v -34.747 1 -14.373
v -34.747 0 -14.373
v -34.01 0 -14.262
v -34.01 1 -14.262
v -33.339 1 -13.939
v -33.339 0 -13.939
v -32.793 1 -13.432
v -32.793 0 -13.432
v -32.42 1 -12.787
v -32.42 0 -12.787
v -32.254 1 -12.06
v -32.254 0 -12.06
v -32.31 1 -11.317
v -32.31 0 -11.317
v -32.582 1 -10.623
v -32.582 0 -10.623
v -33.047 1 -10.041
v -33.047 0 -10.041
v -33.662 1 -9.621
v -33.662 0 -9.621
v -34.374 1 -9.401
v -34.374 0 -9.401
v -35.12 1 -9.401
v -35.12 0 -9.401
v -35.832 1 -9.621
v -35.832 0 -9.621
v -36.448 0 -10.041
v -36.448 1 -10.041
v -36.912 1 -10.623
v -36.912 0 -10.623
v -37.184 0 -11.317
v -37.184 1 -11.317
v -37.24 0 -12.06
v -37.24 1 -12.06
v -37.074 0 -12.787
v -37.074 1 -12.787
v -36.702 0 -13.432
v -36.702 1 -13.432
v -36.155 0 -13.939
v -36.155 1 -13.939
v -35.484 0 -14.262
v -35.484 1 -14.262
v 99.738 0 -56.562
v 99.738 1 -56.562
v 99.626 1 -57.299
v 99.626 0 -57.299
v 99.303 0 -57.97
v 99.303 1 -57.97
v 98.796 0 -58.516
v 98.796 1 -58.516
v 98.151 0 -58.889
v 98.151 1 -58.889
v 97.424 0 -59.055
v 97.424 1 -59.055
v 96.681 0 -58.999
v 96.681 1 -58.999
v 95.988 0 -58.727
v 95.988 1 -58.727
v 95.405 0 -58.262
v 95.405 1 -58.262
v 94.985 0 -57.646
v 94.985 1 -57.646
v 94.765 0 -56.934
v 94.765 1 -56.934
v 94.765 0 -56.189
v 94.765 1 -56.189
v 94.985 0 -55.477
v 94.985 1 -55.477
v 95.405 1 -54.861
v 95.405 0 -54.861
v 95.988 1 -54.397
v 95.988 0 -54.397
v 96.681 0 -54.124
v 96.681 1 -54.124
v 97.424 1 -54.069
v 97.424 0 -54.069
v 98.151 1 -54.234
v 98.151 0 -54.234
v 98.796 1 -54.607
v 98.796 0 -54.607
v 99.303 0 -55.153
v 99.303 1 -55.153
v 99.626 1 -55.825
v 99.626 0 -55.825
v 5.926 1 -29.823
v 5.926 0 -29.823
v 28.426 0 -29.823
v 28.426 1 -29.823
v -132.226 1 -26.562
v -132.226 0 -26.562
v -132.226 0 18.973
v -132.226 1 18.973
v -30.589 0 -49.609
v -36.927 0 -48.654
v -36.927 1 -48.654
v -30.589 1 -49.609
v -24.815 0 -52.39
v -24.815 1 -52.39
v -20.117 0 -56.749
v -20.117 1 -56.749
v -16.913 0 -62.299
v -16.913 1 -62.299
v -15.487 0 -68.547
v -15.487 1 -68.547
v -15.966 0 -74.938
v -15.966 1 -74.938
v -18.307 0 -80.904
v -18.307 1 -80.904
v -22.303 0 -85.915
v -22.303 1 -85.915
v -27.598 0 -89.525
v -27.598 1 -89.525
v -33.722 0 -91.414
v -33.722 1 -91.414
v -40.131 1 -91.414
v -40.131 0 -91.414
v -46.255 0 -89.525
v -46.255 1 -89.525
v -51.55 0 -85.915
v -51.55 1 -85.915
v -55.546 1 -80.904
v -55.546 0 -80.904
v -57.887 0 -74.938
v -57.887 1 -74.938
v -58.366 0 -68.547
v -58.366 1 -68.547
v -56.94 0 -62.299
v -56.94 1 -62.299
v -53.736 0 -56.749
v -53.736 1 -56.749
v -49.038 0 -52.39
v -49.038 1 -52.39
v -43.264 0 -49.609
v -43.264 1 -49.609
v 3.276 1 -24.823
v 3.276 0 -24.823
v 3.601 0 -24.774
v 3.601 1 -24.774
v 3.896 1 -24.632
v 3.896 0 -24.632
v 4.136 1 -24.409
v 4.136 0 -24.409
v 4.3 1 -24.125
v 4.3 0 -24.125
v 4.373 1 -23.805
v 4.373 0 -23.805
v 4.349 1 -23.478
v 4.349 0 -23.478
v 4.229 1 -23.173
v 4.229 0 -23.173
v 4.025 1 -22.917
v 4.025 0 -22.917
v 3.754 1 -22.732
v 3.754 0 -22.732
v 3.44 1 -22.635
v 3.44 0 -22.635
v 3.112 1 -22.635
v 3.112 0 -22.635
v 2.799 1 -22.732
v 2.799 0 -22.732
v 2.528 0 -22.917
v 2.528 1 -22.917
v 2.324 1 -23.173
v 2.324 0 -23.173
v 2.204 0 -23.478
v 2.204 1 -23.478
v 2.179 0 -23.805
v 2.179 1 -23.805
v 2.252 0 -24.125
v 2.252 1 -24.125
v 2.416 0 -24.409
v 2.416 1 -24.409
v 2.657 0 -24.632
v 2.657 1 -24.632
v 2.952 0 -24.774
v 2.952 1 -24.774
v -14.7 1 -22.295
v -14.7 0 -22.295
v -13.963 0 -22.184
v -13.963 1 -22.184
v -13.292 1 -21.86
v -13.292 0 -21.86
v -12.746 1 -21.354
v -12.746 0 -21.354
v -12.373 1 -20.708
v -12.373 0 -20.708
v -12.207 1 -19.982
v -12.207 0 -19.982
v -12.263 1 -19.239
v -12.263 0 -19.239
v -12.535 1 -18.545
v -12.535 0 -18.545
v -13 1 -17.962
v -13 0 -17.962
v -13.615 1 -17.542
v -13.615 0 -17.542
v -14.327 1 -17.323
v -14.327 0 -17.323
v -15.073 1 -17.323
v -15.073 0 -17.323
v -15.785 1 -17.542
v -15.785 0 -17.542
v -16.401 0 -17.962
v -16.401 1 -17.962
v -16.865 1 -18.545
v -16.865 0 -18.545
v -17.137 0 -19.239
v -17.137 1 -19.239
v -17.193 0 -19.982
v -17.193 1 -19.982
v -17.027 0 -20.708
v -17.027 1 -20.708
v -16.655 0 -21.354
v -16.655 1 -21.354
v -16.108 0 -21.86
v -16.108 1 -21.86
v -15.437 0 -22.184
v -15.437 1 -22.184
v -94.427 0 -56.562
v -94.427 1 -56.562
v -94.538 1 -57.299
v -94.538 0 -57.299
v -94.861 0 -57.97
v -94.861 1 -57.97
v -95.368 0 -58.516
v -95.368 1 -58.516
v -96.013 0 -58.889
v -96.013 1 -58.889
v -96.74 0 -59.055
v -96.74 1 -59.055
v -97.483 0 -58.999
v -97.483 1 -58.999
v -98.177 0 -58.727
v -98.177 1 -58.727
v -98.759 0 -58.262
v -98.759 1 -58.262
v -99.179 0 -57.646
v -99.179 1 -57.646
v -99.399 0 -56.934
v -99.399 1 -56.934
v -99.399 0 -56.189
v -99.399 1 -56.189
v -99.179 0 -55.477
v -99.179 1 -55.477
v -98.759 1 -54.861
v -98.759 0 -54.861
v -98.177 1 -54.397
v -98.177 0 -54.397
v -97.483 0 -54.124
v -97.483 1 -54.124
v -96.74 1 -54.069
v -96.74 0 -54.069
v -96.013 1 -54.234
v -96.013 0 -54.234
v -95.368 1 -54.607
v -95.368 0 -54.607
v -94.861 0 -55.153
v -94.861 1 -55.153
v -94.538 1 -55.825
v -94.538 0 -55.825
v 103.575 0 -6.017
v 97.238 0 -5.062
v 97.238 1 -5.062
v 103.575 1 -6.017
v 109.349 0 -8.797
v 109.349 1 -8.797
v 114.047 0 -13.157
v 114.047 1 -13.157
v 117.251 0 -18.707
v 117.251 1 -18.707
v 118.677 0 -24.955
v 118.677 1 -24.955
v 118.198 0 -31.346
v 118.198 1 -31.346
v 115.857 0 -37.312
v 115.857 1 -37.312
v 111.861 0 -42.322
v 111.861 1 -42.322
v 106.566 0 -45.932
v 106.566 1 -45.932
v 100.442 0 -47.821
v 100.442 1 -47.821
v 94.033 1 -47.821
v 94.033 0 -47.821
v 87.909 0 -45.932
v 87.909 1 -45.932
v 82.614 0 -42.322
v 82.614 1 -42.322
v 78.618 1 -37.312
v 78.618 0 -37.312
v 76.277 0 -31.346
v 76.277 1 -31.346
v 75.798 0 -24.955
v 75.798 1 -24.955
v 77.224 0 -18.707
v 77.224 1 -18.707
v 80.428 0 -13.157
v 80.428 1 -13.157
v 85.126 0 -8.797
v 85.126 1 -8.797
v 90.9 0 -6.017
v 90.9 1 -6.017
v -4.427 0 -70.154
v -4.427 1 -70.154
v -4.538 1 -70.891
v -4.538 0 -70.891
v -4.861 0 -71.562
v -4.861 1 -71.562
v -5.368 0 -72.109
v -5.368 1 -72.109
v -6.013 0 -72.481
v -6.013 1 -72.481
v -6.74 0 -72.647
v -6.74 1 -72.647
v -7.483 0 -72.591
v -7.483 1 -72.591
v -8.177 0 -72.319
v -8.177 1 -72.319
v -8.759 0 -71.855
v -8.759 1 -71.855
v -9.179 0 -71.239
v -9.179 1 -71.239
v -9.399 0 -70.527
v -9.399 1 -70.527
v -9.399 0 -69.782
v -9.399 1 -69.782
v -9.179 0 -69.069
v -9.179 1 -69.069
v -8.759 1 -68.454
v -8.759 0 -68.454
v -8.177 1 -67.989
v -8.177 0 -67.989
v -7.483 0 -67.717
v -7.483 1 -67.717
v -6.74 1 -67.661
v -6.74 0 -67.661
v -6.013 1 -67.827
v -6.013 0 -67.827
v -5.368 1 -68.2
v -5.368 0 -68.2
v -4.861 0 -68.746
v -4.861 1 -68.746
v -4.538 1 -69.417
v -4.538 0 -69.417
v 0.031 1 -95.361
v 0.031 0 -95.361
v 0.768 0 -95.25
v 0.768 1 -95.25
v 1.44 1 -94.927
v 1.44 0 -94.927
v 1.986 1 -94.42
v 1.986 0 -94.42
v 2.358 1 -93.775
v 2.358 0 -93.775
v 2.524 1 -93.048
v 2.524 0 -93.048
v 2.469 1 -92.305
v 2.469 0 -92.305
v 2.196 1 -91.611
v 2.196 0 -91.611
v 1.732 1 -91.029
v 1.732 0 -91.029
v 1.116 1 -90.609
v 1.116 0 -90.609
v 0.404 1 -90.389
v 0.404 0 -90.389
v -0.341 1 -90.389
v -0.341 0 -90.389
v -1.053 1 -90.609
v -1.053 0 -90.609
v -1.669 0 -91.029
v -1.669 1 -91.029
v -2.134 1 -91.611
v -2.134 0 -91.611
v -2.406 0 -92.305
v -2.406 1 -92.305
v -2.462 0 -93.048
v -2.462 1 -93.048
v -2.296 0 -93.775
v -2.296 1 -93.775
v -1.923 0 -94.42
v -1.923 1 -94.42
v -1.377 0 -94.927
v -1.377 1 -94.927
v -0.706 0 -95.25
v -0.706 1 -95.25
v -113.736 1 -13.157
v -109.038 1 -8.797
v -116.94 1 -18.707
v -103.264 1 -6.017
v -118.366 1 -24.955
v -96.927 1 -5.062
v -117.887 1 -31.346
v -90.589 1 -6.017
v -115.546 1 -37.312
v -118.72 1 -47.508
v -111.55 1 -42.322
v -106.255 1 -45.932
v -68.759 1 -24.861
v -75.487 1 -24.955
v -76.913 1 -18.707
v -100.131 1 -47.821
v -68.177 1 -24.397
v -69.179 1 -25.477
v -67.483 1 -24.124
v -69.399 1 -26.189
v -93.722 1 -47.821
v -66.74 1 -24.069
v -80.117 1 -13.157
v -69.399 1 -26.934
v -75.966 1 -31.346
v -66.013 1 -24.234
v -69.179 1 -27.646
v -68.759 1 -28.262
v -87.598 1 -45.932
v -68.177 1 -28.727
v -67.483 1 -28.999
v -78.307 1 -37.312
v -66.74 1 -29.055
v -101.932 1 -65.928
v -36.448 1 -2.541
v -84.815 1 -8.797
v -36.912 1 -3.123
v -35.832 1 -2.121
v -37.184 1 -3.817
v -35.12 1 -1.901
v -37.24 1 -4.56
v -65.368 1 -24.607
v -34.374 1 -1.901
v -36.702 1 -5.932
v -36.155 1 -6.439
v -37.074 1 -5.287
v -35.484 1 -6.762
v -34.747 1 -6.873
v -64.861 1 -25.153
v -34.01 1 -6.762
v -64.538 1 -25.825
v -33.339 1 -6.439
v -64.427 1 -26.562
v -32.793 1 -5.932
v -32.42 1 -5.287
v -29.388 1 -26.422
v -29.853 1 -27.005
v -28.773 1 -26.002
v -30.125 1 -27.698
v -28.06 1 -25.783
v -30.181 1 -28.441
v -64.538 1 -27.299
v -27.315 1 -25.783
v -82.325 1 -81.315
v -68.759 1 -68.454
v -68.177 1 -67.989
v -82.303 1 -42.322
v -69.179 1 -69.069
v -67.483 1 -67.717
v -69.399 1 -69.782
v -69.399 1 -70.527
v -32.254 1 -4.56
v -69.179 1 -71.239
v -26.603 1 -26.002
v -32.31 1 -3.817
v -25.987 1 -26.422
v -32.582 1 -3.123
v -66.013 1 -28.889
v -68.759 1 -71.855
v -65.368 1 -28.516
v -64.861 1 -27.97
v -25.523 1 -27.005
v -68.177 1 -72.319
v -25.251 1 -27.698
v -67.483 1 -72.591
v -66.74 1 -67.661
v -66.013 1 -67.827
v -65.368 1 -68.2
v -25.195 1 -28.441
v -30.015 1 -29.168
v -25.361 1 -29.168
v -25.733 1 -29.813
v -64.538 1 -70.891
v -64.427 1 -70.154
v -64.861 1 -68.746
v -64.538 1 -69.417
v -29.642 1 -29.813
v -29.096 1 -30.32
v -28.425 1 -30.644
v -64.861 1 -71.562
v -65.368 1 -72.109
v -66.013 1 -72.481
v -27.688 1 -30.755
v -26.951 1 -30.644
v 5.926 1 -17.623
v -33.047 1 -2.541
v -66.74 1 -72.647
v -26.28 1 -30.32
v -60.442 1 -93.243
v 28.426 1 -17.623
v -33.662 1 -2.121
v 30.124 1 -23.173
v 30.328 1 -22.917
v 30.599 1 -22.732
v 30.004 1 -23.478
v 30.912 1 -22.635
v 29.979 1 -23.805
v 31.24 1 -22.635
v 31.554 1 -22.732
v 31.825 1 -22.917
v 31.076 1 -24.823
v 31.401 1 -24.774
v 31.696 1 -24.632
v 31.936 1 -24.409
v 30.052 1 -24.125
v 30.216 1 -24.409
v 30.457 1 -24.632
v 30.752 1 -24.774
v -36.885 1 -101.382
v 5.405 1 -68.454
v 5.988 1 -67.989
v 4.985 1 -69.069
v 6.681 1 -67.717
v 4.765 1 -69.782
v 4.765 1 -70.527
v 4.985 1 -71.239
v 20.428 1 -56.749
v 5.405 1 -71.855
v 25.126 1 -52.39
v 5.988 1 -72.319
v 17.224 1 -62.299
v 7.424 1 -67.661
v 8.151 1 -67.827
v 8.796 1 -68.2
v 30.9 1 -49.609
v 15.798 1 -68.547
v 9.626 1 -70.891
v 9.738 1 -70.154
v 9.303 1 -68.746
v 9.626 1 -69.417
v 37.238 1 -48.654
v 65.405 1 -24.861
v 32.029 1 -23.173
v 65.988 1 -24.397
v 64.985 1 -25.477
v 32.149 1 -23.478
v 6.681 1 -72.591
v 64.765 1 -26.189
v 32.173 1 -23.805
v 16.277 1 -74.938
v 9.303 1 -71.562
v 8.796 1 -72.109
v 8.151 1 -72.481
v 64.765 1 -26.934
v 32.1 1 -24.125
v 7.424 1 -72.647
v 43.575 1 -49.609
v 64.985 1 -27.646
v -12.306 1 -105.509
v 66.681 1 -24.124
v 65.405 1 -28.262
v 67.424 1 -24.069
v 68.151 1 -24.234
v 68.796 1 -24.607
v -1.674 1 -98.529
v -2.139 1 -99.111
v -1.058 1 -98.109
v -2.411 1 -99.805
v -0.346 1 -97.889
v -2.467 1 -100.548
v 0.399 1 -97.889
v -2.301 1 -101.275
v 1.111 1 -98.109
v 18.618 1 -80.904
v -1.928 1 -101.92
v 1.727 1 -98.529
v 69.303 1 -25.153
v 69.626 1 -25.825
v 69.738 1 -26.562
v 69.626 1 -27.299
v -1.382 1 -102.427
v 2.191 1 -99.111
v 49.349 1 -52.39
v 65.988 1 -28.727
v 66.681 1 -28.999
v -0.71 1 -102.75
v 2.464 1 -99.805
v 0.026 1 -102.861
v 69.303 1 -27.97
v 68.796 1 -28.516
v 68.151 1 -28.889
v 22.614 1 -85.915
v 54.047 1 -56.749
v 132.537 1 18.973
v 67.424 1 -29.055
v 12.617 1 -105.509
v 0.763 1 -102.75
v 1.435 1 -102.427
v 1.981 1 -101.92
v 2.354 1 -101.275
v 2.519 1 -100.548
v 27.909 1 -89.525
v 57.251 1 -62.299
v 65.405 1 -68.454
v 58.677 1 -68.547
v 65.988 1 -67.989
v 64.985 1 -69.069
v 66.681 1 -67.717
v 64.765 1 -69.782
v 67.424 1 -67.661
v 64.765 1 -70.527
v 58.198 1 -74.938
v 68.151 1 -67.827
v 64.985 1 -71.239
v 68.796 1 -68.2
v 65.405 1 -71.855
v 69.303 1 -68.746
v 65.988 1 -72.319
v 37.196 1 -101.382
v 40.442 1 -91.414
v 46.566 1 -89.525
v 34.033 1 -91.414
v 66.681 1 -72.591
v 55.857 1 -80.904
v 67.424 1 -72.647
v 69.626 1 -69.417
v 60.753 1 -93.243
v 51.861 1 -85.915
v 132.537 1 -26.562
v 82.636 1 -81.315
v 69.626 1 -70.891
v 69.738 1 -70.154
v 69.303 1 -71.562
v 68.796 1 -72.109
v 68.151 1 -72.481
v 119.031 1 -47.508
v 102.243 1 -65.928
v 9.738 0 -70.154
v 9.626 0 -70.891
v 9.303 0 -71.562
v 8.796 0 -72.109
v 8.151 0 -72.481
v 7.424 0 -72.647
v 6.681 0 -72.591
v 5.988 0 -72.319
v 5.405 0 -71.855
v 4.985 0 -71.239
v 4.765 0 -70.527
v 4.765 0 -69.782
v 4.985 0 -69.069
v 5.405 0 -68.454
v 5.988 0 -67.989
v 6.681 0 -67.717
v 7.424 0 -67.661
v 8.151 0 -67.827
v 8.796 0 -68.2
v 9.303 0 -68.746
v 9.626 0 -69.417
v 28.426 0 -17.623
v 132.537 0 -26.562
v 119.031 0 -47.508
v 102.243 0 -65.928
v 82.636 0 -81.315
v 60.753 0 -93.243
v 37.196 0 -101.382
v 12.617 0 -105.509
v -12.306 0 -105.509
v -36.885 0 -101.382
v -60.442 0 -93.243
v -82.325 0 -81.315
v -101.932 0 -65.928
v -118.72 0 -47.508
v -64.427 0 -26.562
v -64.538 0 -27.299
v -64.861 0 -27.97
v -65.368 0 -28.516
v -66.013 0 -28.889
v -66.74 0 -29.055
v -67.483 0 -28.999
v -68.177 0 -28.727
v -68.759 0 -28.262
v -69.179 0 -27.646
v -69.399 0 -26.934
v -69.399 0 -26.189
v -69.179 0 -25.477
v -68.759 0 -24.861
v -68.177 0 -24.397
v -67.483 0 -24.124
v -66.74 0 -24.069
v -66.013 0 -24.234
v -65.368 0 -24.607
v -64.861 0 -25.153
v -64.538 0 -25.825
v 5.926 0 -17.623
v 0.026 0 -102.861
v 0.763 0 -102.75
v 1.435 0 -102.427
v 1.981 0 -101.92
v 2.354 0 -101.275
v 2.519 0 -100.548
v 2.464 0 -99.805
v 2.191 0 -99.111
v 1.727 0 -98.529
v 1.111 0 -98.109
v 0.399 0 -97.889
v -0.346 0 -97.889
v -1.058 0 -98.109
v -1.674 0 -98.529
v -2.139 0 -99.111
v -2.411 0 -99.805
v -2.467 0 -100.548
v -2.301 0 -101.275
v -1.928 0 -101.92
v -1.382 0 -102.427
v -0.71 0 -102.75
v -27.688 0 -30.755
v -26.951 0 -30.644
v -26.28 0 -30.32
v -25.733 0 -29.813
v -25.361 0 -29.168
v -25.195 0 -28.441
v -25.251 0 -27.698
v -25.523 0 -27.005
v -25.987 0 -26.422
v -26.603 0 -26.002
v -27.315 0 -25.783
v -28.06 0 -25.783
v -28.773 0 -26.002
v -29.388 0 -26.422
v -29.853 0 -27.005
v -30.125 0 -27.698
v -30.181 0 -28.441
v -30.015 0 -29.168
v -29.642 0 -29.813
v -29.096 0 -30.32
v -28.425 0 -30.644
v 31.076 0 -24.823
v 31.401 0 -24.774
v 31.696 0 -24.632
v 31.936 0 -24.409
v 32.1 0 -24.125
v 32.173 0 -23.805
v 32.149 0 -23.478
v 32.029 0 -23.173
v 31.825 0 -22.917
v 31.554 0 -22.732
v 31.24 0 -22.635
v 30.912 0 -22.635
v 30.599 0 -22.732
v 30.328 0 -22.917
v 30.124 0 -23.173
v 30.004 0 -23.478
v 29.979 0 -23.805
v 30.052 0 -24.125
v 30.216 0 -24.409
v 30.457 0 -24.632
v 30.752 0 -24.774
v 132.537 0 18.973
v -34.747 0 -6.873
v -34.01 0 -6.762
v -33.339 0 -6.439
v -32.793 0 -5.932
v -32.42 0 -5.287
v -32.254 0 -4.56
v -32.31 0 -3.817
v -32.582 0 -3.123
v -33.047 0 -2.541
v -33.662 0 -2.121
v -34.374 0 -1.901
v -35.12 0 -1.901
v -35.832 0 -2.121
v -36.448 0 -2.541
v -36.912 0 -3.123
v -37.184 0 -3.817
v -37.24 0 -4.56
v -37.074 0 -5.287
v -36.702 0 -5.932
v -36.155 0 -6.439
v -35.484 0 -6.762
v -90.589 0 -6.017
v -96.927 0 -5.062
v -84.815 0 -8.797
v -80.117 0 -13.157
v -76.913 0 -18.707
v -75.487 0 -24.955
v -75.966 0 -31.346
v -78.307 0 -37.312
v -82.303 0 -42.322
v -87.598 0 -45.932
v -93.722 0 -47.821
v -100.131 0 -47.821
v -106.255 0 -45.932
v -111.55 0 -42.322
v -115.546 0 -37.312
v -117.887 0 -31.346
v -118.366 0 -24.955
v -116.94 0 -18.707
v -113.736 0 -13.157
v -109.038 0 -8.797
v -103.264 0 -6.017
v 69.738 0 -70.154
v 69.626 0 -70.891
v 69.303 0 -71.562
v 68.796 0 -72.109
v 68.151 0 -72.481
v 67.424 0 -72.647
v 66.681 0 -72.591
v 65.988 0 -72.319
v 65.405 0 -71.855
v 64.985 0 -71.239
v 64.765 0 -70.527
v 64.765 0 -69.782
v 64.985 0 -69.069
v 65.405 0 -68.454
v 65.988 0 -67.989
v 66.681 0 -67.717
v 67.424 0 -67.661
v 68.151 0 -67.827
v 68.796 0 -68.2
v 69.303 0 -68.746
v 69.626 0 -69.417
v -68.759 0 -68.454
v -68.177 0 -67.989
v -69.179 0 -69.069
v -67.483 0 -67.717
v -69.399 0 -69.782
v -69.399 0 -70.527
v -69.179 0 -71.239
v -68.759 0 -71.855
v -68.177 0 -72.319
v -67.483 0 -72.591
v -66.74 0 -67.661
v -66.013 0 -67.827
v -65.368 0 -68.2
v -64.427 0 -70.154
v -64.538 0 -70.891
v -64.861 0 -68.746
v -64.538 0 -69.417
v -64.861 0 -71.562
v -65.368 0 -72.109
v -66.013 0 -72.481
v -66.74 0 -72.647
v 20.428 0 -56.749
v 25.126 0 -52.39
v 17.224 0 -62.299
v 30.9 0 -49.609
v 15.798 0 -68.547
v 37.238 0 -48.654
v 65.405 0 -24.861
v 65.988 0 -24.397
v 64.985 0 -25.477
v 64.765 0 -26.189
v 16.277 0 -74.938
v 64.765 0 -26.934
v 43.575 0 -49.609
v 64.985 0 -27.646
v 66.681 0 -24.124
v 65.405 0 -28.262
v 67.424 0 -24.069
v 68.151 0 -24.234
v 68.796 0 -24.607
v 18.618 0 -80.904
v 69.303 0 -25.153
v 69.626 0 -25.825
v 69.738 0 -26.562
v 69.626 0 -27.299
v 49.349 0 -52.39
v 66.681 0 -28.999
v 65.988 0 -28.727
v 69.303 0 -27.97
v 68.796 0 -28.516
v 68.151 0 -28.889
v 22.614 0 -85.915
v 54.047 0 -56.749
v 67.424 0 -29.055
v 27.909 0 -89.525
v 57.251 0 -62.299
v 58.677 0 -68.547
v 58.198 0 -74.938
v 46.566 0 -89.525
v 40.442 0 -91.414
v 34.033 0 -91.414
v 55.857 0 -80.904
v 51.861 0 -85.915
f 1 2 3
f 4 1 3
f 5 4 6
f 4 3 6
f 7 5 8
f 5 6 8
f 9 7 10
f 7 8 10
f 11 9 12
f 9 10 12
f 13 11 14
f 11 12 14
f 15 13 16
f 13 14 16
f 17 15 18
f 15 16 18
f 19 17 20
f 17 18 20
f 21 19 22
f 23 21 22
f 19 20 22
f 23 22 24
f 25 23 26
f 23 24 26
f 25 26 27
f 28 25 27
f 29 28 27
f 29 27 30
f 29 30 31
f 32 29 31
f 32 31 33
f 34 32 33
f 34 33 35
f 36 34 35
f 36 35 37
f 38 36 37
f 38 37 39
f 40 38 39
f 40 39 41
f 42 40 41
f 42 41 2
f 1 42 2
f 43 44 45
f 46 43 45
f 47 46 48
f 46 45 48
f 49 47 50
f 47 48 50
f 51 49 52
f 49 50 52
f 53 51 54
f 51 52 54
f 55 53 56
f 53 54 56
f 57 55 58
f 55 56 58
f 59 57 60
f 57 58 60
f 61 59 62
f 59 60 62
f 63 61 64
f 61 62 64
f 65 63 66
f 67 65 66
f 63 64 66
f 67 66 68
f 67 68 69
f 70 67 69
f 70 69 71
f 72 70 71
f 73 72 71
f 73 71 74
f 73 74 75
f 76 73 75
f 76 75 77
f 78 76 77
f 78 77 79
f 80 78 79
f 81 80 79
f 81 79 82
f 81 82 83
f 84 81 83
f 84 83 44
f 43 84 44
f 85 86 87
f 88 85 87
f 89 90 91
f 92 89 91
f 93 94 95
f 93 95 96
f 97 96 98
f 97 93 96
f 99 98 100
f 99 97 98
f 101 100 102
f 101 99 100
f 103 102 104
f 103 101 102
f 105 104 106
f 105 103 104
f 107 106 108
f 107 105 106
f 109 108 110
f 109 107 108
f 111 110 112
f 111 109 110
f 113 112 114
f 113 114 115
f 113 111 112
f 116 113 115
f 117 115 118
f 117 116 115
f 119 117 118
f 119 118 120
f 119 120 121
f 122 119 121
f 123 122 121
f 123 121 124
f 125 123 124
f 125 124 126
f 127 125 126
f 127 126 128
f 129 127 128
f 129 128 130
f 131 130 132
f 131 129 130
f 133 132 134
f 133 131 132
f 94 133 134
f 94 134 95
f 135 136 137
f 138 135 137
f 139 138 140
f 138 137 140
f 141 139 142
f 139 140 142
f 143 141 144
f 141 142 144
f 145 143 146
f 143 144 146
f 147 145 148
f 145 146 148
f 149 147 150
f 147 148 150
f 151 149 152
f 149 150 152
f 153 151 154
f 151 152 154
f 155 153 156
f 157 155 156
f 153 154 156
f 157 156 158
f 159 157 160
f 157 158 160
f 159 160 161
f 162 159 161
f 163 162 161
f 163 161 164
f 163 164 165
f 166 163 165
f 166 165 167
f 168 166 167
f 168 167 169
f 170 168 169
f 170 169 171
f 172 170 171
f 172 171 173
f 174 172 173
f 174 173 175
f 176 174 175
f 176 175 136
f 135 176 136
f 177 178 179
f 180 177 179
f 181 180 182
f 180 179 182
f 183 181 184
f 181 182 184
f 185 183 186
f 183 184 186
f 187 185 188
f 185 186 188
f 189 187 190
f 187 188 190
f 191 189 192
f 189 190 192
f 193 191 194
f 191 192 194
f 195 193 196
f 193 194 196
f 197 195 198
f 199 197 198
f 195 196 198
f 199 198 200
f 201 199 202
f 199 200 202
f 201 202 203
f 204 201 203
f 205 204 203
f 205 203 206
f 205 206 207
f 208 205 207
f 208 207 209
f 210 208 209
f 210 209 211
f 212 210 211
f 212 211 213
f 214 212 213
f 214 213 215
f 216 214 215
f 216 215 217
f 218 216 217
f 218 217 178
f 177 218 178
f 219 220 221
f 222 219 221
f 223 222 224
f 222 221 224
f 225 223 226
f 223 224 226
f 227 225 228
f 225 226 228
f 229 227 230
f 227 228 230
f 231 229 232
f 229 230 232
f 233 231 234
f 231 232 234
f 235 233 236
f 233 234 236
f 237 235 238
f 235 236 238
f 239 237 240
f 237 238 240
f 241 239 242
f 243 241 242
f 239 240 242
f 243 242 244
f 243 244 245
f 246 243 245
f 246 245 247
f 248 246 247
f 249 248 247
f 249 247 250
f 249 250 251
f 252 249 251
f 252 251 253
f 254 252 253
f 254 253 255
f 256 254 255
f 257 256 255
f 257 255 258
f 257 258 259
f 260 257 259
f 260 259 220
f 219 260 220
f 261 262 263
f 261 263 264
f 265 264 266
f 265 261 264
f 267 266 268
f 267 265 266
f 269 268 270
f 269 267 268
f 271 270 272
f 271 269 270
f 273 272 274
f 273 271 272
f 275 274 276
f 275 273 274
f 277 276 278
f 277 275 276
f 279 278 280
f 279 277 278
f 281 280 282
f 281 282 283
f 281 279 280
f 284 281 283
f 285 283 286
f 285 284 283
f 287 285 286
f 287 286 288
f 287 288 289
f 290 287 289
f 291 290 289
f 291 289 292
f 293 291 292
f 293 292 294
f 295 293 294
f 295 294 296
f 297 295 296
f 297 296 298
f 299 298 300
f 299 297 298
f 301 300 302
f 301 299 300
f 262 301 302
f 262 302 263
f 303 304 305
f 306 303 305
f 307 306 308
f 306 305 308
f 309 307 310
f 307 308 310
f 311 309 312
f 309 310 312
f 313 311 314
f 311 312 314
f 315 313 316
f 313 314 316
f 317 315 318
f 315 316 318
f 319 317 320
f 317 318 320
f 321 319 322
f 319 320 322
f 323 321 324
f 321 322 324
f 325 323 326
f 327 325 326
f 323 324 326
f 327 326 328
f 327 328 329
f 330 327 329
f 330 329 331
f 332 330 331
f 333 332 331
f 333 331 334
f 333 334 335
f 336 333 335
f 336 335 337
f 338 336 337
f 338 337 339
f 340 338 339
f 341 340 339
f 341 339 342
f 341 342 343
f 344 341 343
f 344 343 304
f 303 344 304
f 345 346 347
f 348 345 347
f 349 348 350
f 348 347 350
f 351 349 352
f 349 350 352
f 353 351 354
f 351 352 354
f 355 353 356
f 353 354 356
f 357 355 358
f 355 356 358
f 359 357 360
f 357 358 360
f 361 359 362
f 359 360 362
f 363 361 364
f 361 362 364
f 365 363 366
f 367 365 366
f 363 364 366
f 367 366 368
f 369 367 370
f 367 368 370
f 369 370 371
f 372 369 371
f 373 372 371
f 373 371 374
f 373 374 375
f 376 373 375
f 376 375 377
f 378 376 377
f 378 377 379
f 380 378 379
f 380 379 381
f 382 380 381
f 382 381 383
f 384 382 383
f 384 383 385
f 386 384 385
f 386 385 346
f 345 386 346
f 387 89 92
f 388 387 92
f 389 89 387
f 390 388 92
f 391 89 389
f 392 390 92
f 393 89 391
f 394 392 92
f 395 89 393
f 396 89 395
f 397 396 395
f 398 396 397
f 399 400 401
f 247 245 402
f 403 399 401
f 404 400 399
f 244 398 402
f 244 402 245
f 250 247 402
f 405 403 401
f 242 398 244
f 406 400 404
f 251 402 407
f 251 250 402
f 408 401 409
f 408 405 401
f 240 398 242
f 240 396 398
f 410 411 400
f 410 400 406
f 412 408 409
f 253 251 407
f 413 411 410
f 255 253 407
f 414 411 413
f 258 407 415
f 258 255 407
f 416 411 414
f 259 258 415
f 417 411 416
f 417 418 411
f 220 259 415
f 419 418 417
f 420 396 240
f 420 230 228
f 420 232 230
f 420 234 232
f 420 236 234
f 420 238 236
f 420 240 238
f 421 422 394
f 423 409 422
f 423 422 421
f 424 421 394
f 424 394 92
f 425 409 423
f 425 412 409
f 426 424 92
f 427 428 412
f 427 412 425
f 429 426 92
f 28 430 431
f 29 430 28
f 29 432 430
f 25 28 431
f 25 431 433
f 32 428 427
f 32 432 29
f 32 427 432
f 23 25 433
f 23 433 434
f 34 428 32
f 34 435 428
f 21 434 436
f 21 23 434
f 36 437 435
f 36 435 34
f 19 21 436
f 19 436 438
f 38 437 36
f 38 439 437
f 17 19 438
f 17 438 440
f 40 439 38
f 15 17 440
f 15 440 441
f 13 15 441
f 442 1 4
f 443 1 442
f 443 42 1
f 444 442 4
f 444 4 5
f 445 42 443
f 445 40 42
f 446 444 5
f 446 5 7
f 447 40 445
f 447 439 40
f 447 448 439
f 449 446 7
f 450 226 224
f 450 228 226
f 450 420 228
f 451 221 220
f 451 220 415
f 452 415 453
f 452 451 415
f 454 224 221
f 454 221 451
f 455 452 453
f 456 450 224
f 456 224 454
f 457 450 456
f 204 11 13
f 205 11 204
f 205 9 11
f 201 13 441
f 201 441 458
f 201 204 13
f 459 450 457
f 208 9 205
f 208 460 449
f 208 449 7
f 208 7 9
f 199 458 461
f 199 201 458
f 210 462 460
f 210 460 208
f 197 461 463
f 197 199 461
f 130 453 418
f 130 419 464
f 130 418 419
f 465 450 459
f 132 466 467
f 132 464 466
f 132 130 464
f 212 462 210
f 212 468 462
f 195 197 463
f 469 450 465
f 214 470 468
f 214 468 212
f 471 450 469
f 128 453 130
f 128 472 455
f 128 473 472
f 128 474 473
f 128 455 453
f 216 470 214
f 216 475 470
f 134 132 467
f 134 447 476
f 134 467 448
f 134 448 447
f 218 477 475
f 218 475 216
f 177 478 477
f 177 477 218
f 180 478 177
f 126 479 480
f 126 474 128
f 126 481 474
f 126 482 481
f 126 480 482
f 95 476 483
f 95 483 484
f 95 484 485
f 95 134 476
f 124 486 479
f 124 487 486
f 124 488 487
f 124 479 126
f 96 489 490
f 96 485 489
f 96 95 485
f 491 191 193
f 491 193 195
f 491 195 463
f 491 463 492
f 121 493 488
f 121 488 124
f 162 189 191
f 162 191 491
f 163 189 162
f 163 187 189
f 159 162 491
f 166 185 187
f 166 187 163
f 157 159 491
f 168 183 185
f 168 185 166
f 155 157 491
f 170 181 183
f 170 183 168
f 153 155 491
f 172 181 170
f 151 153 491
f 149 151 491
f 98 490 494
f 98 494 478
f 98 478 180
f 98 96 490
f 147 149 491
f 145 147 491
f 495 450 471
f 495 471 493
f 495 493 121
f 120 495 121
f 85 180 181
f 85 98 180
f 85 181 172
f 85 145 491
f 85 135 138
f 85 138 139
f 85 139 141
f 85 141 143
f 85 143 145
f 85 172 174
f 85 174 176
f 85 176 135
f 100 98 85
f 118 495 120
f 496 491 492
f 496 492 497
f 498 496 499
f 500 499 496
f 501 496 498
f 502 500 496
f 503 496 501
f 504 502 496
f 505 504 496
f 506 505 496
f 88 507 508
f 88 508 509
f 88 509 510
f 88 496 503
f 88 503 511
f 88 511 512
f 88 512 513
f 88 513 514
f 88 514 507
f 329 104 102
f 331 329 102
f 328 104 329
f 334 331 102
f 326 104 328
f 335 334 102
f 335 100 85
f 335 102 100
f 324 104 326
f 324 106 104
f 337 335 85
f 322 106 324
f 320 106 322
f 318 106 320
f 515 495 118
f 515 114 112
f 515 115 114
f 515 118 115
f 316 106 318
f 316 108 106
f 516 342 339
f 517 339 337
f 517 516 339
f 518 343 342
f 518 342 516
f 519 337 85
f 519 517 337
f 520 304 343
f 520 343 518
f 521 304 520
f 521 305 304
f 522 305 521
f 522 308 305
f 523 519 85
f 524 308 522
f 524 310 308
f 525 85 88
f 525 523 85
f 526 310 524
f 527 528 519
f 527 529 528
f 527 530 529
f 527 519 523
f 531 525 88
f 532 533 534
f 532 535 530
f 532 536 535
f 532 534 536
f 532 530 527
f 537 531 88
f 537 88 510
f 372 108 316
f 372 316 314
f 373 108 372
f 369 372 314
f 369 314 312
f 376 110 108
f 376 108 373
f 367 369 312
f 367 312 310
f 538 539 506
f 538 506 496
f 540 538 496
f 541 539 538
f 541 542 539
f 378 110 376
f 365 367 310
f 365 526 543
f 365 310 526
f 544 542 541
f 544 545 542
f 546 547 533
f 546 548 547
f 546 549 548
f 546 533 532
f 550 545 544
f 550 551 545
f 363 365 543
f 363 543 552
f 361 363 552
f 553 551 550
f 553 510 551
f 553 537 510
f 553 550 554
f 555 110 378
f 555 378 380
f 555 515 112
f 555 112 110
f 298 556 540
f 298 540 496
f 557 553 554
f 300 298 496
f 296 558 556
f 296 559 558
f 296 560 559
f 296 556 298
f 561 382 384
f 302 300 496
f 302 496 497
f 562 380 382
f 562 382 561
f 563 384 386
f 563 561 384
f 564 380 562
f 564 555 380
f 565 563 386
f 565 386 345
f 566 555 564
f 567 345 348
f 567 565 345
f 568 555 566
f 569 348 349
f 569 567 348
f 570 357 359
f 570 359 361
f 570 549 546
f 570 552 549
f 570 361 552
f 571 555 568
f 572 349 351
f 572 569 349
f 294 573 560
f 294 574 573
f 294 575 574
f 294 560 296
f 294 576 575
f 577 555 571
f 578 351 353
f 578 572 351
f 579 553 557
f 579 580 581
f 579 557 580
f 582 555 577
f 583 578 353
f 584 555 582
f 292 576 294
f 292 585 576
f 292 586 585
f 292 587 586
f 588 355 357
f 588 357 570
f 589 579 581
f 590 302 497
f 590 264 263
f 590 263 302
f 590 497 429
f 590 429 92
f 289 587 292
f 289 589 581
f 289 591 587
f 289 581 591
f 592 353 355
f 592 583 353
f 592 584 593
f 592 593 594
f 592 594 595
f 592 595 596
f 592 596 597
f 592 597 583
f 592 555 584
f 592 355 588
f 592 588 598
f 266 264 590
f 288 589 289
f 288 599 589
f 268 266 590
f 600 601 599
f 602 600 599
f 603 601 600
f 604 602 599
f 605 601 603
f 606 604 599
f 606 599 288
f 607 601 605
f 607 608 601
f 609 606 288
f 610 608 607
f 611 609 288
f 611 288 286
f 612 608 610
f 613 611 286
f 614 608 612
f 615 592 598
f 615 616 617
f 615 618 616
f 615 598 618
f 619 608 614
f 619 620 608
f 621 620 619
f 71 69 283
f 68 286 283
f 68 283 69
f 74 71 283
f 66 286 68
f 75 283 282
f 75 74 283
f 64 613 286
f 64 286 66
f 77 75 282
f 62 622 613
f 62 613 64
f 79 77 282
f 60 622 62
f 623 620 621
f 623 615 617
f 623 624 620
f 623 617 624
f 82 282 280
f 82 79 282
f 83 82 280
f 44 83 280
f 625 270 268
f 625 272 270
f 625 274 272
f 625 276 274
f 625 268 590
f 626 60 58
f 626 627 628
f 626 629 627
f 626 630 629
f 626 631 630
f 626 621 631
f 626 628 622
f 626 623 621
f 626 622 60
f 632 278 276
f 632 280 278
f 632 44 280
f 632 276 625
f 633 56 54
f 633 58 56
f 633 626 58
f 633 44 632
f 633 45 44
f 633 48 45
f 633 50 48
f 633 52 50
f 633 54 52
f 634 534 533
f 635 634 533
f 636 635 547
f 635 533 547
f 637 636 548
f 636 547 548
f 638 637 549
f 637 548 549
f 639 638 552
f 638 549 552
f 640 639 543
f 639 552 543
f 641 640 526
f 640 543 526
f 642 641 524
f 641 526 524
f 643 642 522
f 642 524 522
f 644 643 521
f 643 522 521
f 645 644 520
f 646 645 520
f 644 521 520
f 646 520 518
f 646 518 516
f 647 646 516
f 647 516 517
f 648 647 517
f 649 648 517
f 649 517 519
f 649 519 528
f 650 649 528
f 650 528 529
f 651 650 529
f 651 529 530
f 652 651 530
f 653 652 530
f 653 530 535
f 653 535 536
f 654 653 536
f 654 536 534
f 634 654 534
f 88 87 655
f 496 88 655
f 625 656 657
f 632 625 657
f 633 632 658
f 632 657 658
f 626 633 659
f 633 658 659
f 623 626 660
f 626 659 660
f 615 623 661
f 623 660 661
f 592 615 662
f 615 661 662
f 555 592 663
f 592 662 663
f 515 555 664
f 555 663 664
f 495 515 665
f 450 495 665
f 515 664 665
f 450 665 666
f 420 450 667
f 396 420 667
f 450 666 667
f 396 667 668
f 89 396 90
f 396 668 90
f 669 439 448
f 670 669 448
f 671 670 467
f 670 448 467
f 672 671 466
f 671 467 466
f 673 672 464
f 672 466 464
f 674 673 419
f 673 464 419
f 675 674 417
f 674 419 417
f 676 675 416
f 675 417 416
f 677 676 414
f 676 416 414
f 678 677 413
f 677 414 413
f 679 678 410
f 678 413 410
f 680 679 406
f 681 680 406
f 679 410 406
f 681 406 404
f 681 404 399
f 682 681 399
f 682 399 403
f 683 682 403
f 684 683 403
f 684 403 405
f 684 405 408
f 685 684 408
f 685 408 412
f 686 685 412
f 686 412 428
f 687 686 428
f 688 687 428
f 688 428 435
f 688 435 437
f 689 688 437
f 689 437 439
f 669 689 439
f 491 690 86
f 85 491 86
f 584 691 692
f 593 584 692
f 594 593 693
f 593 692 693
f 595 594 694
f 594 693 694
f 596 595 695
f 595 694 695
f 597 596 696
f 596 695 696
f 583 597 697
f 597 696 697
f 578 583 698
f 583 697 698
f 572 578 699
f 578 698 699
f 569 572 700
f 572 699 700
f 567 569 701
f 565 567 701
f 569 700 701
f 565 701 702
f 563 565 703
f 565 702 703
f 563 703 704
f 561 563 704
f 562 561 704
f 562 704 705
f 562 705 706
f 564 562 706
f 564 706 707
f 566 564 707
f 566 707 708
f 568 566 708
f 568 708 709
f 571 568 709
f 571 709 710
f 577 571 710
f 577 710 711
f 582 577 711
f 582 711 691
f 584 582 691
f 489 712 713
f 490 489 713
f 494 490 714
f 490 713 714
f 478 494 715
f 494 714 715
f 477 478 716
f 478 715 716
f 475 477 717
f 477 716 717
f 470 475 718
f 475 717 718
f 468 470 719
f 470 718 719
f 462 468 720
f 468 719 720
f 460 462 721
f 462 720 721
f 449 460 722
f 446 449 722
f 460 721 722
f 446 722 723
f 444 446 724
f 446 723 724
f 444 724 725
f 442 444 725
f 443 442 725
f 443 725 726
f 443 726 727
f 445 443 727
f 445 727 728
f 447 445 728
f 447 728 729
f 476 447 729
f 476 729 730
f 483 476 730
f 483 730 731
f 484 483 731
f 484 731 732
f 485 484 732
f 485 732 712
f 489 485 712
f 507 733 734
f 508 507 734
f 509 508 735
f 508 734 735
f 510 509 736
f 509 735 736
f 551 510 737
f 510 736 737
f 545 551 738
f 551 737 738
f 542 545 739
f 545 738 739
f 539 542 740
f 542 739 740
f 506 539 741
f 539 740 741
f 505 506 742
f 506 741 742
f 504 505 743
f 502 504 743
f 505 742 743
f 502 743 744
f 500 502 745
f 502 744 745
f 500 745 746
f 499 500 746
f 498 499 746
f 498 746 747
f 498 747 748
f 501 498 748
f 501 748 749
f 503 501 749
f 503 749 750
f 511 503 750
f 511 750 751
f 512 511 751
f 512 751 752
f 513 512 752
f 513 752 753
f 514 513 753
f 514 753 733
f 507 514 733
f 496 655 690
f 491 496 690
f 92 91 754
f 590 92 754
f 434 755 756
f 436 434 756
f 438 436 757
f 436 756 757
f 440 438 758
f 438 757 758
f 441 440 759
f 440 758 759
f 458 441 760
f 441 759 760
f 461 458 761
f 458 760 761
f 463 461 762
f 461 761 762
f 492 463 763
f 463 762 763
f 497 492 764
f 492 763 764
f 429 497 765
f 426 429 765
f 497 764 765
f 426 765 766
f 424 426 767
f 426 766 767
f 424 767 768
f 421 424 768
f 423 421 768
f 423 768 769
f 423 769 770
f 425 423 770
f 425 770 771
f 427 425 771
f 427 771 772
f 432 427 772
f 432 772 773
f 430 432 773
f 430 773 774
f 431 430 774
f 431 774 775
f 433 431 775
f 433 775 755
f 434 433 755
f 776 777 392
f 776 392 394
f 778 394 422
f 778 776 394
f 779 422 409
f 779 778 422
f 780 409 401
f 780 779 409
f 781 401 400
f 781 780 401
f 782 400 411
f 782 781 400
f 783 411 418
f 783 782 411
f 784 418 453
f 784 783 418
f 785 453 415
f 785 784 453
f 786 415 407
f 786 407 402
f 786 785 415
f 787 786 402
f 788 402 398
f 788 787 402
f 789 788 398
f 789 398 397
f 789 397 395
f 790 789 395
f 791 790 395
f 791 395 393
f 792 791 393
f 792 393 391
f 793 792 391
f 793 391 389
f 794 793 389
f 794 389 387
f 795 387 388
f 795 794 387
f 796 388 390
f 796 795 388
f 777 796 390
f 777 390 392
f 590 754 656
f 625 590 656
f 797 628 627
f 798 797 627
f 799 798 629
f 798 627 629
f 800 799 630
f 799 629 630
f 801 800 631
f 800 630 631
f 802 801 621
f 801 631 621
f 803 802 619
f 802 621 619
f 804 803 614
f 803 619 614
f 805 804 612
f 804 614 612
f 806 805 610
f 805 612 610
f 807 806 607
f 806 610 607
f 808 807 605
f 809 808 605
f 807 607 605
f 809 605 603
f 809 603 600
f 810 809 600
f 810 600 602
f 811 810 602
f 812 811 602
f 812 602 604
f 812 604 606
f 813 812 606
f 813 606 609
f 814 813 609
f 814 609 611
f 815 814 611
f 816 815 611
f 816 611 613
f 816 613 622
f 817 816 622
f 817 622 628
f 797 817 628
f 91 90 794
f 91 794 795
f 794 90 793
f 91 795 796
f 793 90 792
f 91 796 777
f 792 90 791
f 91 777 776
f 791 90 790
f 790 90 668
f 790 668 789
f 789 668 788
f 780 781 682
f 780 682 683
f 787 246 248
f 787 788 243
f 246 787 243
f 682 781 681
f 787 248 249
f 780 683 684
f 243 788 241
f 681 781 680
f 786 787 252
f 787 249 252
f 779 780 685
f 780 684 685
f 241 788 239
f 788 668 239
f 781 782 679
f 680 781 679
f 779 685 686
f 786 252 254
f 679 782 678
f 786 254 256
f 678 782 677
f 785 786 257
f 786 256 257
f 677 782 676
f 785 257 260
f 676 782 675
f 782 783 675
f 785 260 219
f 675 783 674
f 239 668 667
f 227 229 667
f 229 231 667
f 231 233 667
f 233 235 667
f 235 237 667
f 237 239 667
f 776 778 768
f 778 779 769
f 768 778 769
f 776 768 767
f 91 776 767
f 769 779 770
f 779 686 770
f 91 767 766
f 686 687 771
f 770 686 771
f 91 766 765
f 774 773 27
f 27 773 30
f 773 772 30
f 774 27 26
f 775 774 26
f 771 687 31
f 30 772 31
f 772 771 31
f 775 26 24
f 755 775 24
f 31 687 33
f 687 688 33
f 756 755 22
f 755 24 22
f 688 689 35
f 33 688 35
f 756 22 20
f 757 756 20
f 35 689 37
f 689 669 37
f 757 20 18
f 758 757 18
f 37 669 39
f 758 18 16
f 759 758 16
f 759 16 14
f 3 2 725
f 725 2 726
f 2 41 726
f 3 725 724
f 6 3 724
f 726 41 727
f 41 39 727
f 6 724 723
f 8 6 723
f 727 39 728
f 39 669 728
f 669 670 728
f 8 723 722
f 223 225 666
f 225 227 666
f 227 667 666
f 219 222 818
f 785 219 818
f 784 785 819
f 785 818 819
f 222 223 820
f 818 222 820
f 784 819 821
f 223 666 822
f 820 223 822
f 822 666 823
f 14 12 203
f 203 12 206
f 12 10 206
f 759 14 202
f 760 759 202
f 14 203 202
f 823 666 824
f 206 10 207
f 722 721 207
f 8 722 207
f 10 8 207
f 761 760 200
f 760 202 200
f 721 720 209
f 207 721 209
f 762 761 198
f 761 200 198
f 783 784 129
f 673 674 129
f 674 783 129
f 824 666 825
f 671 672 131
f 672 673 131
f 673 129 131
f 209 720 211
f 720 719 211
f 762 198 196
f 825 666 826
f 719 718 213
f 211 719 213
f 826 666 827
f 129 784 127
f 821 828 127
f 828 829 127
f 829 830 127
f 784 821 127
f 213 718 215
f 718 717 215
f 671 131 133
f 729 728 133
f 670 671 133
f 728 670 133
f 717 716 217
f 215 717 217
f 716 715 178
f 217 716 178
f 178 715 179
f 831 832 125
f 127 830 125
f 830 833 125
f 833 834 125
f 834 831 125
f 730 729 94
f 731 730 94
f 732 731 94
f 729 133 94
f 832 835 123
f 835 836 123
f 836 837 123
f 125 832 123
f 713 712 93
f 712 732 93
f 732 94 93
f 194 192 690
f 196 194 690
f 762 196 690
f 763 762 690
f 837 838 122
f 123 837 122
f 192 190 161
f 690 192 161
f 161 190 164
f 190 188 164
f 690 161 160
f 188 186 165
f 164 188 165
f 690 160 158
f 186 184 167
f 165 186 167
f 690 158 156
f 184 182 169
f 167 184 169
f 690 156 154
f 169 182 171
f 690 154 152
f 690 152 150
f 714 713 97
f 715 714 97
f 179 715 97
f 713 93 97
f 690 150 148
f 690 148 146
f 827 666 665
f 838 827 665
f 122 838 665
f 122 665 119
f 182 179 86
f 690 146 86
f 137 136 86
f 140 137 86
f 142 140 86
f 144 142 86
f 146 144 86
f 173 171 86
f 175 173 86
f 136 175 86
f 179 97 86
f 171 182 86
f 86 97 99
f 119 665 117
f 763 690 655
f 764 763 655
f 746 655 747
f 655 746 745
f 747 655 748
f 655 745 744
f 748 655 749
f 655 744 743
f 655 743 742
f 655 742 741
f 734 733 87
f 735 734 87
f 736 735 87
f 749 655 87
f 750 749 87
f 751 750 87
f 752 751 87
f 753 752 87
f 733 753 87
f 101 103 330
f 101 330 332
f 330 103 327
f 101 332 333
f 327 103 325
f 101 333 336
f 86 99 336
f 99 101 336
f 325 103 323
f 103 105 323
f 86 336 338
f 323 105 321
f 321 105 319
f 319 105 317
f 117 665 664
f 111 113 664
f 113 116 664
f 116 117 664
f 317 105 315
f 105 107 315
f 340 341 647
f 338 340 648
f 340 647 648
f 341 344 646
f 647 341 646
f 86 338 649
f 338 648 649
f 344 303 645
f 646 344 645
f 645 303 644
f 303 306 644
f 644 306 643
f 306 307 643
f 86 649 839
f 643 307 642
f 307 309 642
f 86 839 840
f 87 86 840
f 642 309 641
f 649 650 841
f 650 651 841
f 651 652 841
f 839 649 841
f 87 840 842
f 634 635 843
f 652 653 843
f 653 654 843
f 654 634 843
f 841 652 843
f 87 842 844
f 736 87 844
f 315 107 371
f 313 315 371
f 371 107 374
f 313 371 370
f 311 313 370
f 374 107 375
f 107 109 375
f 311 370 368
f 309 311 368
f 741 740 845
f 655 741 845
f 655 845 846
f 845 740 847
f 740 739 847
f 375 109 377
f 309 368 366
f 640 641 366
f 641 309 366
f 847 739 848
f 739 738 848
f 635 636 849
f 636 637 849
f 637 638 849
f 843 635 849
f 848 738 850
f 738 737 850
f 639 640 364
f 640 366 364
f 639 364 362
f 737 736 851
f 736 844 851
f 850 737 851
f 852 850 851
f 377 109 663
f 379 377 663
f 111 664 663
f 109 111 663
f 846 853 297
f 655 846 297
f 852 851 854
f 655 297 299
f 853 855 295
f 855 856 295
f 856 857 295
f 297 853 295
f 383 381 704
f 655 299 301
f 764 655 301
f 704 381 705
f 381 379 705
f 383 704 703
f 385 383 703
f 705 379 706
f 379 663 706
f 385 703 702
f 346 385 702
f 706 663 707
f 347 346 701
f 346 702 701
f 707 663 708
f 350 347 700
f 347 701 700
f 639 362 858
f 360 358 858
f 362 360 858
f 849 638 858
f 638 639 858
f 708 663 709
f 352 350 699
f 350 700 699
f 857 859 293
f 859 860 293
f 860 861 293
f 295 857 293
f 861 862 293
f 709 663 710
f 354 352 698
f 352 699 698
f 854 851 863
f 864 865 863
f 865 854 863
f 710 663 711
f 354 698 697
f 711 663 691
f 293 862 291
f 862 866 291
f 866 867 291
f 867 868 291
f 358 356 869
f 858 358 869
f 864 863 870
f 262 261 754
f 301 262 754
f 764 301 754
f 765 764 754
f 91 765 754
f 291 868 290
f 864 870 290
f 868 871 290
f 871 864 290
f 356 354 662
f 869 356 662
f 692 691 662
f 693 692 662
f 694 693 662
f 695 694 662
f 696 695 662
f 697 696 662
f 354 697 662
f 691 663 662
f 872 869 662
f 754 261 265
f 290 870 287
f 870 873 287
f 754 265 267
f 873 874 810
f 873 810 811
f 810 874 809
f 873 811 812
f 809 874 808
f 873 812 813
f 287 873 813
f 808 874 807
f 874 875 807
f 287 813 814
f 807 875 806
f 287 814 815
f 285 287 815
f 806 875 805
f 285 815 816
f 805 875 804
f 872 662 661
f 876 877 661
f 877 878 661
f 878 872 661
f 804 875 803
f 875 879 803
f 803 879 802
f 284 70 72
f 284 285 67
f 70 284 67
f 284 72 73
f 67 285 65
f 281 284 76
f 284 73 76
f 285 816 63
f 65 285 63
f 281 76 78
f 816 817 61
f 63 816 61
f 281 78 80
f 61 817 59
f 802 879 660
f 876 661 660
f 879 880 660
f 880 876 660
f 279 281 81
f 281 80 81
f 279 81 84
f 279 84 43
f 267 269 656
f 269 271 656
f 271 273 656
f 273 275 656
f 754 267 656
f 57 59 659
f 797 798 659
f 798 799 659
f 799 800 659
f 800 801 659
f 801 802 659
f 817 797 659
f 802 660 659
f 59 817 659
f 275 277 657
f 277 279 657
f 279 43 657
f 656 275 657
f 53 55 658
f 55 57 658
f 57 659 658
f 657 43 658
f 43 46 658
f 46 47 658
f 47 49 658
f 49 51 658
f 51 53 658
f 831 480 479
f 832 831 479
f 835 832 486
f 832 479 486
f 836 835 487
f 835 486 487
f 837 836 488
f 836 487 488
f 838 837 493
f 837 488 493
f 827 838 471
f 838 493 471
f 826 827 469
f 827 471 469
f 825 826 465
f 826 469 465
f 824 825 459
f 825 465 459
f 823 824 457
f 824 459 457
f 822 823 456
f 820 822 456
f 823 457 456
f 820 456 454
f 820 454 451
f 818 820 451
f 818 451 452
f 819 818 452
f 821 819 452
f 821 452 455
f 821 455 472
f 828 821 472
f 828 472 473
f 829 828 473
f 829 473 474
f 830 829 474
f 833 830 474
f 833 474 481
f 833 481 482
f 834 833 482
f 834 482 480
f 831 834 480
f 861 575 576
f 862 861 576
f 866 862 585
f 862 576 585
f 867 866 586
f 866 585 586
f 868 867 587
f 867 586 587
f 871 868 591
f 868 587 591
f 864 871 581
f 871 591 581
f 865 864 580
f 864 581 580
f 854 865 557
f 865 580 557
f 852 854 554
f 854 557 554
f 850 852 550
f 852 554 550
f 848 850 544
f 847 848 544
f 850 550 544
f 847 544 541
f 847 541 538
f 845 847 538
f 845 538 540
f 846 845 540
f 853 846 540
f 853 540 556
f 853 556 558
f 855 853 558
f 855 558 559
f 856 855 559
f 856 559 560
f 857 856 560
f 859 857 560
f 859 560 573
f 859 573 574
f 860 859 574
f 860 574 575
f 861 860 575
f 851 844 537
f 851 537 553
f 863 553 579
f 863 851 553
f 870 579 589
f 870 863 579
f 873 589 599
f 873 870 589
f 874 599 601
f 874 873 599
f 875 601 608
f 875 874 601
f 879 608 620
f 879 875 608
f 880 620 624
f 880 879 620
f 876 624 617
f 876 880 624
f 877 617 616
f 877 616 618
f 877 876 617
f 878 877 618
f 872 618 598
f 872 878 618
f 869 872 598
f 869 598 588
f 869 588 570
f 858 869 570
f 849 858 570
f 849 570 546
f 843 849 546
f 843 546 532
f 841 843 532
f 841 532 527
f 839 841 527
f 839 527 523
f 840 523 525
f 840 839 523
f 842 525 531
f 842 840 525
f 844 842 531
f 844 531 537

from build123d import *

# Parameters (mm, degrees)
SKETCH3_R             = 21.5
BOSS_EXTRUDE3_DEPTH   = 1
F_5_0MM_DOWEL_HOLE1_D = 5
SKETCH10_R            = 2.5
SKETCH10_R_2          = 1.1
CUT_EXTRUDE3_DEPTH    = 170.731914631


with BuildPart() as part:
    # Sketch3 → Boss-Extrude3 (new body)
    with BuildSketch(Plane(origin=(0, 0, 0), x_dir=(1, 0, 0), z_dir=(0, 1, 0))):
        with BuildLine():
            Line((-132.226234517, -18.972612677), (132.537224892, -18.972612677))
            Line((132.537224892, -18.972612677), (132.537224892, 26.561617598))
            ThreePointArc((132.537224892, 26.561617598), (0.155495187, 106.027387323), (-132.226234517, 26.561617598))
            Line((-132.226234517, 26.561617598), (-132.226234517, -18.972612677))
        make_face()
        with Locations(Location((-96.926544138, 26.561617598, 0), (0, 0, 270))):
            Circle(SKETCH3_R, mode=Mode.SUBTRACT)
        with Locations(Location((97.237534512, 26.561617598, 0), (0, 0, 270))):
            Circle(SKETCH3_R, mode=Mode.SUBTRACT)
        with Locations(Location((-36.926544138, 70.154169278, 0), (0, 0, 270))):
            Circle(SKETCH3_R, mode=Mode.SUBTRACT)
        with Locations(Location((37.237534512, 70.154169278, 0), (0, 0, 270))):
            Circle(SKETCH3_R, mode=Mode.SUBTRACT)
    extrude(amount=BOSS_EXTRUDE3_DEPTH)

    # Ø5.0mm Dowel Hole1 (through all)
    with Locations(Plane(origin=(0, 0, 0), x_dir=(-1, 0, 0), z_dir=(0, -1, 0))):
        with Locations((-97.237534512, 56.561617598), (-67.237534512, 26.561617598), (-67.237534512, 70.154169278), (-7.237534512, 70.154169278), (6.926544138, 70.154169278), (66.926544138, 70.154169278), (96.926544138, 56.561617598), (66.926544138, 26.561617598)):
            Hole(F_5_0MM_DOWEL_HOLE1_D / 2)

    # Sketch10 → Cut-Extrude3 (cut, through all)
    with BuildSketch(Plane(origin=(0, 0, 0), x_dir=(-1, 0, 0), z_dir=(0, -1, 0))):
        Polygon((-28.426423082, 29.82316033), (-28.426423082, 17.62316033), (-16.520871415, 17.62316033), (-5.926423082, 17.62316033), (-5.926423082, 29.82316033), align=None)
        with Locations(Location((27.687865217, 28.254616687, 0), (0, 0, 90))):
            Circle(SKETCH10_R)
        with Locations(Location((14.700079453, 19.79486368, 0), (0, 0, 90))):
            Circle(SKETCH10_R)
        with Locations(Location((34.747097156, 11.87316033, 0), (0, 0, 90))):
            Circle(SKETCH10_R)
        with Locations(Location((34.747097156, 4.37316033, 0), (0, 0, 90))):
            Circle(SKETCH10_R)
        with Locations(Location((-0.03130886, 92.861330123, 0), (0, 0, 90))):
            Circle(SKETCH10_R)
        with Locations(Location((-0.026423082, 100.361328532, 0), (0, 0, 90))):
            Circle(SKETCH10_R)
        with Locations(Location((-31.076423082, 23.72316033, 0), (0, 0, 90))):
            Circle(SKETCH10_R_2)
        with Locations(Location((-3.276423082, 23.72316033, 0), (0, 0, 90))):
            Circle(SKETCH10_R_2)
    extrude(amount=-CUT_EXTRUDE3_DEPTH, mode=Mode.SUBTRACT)


solid = part.part
